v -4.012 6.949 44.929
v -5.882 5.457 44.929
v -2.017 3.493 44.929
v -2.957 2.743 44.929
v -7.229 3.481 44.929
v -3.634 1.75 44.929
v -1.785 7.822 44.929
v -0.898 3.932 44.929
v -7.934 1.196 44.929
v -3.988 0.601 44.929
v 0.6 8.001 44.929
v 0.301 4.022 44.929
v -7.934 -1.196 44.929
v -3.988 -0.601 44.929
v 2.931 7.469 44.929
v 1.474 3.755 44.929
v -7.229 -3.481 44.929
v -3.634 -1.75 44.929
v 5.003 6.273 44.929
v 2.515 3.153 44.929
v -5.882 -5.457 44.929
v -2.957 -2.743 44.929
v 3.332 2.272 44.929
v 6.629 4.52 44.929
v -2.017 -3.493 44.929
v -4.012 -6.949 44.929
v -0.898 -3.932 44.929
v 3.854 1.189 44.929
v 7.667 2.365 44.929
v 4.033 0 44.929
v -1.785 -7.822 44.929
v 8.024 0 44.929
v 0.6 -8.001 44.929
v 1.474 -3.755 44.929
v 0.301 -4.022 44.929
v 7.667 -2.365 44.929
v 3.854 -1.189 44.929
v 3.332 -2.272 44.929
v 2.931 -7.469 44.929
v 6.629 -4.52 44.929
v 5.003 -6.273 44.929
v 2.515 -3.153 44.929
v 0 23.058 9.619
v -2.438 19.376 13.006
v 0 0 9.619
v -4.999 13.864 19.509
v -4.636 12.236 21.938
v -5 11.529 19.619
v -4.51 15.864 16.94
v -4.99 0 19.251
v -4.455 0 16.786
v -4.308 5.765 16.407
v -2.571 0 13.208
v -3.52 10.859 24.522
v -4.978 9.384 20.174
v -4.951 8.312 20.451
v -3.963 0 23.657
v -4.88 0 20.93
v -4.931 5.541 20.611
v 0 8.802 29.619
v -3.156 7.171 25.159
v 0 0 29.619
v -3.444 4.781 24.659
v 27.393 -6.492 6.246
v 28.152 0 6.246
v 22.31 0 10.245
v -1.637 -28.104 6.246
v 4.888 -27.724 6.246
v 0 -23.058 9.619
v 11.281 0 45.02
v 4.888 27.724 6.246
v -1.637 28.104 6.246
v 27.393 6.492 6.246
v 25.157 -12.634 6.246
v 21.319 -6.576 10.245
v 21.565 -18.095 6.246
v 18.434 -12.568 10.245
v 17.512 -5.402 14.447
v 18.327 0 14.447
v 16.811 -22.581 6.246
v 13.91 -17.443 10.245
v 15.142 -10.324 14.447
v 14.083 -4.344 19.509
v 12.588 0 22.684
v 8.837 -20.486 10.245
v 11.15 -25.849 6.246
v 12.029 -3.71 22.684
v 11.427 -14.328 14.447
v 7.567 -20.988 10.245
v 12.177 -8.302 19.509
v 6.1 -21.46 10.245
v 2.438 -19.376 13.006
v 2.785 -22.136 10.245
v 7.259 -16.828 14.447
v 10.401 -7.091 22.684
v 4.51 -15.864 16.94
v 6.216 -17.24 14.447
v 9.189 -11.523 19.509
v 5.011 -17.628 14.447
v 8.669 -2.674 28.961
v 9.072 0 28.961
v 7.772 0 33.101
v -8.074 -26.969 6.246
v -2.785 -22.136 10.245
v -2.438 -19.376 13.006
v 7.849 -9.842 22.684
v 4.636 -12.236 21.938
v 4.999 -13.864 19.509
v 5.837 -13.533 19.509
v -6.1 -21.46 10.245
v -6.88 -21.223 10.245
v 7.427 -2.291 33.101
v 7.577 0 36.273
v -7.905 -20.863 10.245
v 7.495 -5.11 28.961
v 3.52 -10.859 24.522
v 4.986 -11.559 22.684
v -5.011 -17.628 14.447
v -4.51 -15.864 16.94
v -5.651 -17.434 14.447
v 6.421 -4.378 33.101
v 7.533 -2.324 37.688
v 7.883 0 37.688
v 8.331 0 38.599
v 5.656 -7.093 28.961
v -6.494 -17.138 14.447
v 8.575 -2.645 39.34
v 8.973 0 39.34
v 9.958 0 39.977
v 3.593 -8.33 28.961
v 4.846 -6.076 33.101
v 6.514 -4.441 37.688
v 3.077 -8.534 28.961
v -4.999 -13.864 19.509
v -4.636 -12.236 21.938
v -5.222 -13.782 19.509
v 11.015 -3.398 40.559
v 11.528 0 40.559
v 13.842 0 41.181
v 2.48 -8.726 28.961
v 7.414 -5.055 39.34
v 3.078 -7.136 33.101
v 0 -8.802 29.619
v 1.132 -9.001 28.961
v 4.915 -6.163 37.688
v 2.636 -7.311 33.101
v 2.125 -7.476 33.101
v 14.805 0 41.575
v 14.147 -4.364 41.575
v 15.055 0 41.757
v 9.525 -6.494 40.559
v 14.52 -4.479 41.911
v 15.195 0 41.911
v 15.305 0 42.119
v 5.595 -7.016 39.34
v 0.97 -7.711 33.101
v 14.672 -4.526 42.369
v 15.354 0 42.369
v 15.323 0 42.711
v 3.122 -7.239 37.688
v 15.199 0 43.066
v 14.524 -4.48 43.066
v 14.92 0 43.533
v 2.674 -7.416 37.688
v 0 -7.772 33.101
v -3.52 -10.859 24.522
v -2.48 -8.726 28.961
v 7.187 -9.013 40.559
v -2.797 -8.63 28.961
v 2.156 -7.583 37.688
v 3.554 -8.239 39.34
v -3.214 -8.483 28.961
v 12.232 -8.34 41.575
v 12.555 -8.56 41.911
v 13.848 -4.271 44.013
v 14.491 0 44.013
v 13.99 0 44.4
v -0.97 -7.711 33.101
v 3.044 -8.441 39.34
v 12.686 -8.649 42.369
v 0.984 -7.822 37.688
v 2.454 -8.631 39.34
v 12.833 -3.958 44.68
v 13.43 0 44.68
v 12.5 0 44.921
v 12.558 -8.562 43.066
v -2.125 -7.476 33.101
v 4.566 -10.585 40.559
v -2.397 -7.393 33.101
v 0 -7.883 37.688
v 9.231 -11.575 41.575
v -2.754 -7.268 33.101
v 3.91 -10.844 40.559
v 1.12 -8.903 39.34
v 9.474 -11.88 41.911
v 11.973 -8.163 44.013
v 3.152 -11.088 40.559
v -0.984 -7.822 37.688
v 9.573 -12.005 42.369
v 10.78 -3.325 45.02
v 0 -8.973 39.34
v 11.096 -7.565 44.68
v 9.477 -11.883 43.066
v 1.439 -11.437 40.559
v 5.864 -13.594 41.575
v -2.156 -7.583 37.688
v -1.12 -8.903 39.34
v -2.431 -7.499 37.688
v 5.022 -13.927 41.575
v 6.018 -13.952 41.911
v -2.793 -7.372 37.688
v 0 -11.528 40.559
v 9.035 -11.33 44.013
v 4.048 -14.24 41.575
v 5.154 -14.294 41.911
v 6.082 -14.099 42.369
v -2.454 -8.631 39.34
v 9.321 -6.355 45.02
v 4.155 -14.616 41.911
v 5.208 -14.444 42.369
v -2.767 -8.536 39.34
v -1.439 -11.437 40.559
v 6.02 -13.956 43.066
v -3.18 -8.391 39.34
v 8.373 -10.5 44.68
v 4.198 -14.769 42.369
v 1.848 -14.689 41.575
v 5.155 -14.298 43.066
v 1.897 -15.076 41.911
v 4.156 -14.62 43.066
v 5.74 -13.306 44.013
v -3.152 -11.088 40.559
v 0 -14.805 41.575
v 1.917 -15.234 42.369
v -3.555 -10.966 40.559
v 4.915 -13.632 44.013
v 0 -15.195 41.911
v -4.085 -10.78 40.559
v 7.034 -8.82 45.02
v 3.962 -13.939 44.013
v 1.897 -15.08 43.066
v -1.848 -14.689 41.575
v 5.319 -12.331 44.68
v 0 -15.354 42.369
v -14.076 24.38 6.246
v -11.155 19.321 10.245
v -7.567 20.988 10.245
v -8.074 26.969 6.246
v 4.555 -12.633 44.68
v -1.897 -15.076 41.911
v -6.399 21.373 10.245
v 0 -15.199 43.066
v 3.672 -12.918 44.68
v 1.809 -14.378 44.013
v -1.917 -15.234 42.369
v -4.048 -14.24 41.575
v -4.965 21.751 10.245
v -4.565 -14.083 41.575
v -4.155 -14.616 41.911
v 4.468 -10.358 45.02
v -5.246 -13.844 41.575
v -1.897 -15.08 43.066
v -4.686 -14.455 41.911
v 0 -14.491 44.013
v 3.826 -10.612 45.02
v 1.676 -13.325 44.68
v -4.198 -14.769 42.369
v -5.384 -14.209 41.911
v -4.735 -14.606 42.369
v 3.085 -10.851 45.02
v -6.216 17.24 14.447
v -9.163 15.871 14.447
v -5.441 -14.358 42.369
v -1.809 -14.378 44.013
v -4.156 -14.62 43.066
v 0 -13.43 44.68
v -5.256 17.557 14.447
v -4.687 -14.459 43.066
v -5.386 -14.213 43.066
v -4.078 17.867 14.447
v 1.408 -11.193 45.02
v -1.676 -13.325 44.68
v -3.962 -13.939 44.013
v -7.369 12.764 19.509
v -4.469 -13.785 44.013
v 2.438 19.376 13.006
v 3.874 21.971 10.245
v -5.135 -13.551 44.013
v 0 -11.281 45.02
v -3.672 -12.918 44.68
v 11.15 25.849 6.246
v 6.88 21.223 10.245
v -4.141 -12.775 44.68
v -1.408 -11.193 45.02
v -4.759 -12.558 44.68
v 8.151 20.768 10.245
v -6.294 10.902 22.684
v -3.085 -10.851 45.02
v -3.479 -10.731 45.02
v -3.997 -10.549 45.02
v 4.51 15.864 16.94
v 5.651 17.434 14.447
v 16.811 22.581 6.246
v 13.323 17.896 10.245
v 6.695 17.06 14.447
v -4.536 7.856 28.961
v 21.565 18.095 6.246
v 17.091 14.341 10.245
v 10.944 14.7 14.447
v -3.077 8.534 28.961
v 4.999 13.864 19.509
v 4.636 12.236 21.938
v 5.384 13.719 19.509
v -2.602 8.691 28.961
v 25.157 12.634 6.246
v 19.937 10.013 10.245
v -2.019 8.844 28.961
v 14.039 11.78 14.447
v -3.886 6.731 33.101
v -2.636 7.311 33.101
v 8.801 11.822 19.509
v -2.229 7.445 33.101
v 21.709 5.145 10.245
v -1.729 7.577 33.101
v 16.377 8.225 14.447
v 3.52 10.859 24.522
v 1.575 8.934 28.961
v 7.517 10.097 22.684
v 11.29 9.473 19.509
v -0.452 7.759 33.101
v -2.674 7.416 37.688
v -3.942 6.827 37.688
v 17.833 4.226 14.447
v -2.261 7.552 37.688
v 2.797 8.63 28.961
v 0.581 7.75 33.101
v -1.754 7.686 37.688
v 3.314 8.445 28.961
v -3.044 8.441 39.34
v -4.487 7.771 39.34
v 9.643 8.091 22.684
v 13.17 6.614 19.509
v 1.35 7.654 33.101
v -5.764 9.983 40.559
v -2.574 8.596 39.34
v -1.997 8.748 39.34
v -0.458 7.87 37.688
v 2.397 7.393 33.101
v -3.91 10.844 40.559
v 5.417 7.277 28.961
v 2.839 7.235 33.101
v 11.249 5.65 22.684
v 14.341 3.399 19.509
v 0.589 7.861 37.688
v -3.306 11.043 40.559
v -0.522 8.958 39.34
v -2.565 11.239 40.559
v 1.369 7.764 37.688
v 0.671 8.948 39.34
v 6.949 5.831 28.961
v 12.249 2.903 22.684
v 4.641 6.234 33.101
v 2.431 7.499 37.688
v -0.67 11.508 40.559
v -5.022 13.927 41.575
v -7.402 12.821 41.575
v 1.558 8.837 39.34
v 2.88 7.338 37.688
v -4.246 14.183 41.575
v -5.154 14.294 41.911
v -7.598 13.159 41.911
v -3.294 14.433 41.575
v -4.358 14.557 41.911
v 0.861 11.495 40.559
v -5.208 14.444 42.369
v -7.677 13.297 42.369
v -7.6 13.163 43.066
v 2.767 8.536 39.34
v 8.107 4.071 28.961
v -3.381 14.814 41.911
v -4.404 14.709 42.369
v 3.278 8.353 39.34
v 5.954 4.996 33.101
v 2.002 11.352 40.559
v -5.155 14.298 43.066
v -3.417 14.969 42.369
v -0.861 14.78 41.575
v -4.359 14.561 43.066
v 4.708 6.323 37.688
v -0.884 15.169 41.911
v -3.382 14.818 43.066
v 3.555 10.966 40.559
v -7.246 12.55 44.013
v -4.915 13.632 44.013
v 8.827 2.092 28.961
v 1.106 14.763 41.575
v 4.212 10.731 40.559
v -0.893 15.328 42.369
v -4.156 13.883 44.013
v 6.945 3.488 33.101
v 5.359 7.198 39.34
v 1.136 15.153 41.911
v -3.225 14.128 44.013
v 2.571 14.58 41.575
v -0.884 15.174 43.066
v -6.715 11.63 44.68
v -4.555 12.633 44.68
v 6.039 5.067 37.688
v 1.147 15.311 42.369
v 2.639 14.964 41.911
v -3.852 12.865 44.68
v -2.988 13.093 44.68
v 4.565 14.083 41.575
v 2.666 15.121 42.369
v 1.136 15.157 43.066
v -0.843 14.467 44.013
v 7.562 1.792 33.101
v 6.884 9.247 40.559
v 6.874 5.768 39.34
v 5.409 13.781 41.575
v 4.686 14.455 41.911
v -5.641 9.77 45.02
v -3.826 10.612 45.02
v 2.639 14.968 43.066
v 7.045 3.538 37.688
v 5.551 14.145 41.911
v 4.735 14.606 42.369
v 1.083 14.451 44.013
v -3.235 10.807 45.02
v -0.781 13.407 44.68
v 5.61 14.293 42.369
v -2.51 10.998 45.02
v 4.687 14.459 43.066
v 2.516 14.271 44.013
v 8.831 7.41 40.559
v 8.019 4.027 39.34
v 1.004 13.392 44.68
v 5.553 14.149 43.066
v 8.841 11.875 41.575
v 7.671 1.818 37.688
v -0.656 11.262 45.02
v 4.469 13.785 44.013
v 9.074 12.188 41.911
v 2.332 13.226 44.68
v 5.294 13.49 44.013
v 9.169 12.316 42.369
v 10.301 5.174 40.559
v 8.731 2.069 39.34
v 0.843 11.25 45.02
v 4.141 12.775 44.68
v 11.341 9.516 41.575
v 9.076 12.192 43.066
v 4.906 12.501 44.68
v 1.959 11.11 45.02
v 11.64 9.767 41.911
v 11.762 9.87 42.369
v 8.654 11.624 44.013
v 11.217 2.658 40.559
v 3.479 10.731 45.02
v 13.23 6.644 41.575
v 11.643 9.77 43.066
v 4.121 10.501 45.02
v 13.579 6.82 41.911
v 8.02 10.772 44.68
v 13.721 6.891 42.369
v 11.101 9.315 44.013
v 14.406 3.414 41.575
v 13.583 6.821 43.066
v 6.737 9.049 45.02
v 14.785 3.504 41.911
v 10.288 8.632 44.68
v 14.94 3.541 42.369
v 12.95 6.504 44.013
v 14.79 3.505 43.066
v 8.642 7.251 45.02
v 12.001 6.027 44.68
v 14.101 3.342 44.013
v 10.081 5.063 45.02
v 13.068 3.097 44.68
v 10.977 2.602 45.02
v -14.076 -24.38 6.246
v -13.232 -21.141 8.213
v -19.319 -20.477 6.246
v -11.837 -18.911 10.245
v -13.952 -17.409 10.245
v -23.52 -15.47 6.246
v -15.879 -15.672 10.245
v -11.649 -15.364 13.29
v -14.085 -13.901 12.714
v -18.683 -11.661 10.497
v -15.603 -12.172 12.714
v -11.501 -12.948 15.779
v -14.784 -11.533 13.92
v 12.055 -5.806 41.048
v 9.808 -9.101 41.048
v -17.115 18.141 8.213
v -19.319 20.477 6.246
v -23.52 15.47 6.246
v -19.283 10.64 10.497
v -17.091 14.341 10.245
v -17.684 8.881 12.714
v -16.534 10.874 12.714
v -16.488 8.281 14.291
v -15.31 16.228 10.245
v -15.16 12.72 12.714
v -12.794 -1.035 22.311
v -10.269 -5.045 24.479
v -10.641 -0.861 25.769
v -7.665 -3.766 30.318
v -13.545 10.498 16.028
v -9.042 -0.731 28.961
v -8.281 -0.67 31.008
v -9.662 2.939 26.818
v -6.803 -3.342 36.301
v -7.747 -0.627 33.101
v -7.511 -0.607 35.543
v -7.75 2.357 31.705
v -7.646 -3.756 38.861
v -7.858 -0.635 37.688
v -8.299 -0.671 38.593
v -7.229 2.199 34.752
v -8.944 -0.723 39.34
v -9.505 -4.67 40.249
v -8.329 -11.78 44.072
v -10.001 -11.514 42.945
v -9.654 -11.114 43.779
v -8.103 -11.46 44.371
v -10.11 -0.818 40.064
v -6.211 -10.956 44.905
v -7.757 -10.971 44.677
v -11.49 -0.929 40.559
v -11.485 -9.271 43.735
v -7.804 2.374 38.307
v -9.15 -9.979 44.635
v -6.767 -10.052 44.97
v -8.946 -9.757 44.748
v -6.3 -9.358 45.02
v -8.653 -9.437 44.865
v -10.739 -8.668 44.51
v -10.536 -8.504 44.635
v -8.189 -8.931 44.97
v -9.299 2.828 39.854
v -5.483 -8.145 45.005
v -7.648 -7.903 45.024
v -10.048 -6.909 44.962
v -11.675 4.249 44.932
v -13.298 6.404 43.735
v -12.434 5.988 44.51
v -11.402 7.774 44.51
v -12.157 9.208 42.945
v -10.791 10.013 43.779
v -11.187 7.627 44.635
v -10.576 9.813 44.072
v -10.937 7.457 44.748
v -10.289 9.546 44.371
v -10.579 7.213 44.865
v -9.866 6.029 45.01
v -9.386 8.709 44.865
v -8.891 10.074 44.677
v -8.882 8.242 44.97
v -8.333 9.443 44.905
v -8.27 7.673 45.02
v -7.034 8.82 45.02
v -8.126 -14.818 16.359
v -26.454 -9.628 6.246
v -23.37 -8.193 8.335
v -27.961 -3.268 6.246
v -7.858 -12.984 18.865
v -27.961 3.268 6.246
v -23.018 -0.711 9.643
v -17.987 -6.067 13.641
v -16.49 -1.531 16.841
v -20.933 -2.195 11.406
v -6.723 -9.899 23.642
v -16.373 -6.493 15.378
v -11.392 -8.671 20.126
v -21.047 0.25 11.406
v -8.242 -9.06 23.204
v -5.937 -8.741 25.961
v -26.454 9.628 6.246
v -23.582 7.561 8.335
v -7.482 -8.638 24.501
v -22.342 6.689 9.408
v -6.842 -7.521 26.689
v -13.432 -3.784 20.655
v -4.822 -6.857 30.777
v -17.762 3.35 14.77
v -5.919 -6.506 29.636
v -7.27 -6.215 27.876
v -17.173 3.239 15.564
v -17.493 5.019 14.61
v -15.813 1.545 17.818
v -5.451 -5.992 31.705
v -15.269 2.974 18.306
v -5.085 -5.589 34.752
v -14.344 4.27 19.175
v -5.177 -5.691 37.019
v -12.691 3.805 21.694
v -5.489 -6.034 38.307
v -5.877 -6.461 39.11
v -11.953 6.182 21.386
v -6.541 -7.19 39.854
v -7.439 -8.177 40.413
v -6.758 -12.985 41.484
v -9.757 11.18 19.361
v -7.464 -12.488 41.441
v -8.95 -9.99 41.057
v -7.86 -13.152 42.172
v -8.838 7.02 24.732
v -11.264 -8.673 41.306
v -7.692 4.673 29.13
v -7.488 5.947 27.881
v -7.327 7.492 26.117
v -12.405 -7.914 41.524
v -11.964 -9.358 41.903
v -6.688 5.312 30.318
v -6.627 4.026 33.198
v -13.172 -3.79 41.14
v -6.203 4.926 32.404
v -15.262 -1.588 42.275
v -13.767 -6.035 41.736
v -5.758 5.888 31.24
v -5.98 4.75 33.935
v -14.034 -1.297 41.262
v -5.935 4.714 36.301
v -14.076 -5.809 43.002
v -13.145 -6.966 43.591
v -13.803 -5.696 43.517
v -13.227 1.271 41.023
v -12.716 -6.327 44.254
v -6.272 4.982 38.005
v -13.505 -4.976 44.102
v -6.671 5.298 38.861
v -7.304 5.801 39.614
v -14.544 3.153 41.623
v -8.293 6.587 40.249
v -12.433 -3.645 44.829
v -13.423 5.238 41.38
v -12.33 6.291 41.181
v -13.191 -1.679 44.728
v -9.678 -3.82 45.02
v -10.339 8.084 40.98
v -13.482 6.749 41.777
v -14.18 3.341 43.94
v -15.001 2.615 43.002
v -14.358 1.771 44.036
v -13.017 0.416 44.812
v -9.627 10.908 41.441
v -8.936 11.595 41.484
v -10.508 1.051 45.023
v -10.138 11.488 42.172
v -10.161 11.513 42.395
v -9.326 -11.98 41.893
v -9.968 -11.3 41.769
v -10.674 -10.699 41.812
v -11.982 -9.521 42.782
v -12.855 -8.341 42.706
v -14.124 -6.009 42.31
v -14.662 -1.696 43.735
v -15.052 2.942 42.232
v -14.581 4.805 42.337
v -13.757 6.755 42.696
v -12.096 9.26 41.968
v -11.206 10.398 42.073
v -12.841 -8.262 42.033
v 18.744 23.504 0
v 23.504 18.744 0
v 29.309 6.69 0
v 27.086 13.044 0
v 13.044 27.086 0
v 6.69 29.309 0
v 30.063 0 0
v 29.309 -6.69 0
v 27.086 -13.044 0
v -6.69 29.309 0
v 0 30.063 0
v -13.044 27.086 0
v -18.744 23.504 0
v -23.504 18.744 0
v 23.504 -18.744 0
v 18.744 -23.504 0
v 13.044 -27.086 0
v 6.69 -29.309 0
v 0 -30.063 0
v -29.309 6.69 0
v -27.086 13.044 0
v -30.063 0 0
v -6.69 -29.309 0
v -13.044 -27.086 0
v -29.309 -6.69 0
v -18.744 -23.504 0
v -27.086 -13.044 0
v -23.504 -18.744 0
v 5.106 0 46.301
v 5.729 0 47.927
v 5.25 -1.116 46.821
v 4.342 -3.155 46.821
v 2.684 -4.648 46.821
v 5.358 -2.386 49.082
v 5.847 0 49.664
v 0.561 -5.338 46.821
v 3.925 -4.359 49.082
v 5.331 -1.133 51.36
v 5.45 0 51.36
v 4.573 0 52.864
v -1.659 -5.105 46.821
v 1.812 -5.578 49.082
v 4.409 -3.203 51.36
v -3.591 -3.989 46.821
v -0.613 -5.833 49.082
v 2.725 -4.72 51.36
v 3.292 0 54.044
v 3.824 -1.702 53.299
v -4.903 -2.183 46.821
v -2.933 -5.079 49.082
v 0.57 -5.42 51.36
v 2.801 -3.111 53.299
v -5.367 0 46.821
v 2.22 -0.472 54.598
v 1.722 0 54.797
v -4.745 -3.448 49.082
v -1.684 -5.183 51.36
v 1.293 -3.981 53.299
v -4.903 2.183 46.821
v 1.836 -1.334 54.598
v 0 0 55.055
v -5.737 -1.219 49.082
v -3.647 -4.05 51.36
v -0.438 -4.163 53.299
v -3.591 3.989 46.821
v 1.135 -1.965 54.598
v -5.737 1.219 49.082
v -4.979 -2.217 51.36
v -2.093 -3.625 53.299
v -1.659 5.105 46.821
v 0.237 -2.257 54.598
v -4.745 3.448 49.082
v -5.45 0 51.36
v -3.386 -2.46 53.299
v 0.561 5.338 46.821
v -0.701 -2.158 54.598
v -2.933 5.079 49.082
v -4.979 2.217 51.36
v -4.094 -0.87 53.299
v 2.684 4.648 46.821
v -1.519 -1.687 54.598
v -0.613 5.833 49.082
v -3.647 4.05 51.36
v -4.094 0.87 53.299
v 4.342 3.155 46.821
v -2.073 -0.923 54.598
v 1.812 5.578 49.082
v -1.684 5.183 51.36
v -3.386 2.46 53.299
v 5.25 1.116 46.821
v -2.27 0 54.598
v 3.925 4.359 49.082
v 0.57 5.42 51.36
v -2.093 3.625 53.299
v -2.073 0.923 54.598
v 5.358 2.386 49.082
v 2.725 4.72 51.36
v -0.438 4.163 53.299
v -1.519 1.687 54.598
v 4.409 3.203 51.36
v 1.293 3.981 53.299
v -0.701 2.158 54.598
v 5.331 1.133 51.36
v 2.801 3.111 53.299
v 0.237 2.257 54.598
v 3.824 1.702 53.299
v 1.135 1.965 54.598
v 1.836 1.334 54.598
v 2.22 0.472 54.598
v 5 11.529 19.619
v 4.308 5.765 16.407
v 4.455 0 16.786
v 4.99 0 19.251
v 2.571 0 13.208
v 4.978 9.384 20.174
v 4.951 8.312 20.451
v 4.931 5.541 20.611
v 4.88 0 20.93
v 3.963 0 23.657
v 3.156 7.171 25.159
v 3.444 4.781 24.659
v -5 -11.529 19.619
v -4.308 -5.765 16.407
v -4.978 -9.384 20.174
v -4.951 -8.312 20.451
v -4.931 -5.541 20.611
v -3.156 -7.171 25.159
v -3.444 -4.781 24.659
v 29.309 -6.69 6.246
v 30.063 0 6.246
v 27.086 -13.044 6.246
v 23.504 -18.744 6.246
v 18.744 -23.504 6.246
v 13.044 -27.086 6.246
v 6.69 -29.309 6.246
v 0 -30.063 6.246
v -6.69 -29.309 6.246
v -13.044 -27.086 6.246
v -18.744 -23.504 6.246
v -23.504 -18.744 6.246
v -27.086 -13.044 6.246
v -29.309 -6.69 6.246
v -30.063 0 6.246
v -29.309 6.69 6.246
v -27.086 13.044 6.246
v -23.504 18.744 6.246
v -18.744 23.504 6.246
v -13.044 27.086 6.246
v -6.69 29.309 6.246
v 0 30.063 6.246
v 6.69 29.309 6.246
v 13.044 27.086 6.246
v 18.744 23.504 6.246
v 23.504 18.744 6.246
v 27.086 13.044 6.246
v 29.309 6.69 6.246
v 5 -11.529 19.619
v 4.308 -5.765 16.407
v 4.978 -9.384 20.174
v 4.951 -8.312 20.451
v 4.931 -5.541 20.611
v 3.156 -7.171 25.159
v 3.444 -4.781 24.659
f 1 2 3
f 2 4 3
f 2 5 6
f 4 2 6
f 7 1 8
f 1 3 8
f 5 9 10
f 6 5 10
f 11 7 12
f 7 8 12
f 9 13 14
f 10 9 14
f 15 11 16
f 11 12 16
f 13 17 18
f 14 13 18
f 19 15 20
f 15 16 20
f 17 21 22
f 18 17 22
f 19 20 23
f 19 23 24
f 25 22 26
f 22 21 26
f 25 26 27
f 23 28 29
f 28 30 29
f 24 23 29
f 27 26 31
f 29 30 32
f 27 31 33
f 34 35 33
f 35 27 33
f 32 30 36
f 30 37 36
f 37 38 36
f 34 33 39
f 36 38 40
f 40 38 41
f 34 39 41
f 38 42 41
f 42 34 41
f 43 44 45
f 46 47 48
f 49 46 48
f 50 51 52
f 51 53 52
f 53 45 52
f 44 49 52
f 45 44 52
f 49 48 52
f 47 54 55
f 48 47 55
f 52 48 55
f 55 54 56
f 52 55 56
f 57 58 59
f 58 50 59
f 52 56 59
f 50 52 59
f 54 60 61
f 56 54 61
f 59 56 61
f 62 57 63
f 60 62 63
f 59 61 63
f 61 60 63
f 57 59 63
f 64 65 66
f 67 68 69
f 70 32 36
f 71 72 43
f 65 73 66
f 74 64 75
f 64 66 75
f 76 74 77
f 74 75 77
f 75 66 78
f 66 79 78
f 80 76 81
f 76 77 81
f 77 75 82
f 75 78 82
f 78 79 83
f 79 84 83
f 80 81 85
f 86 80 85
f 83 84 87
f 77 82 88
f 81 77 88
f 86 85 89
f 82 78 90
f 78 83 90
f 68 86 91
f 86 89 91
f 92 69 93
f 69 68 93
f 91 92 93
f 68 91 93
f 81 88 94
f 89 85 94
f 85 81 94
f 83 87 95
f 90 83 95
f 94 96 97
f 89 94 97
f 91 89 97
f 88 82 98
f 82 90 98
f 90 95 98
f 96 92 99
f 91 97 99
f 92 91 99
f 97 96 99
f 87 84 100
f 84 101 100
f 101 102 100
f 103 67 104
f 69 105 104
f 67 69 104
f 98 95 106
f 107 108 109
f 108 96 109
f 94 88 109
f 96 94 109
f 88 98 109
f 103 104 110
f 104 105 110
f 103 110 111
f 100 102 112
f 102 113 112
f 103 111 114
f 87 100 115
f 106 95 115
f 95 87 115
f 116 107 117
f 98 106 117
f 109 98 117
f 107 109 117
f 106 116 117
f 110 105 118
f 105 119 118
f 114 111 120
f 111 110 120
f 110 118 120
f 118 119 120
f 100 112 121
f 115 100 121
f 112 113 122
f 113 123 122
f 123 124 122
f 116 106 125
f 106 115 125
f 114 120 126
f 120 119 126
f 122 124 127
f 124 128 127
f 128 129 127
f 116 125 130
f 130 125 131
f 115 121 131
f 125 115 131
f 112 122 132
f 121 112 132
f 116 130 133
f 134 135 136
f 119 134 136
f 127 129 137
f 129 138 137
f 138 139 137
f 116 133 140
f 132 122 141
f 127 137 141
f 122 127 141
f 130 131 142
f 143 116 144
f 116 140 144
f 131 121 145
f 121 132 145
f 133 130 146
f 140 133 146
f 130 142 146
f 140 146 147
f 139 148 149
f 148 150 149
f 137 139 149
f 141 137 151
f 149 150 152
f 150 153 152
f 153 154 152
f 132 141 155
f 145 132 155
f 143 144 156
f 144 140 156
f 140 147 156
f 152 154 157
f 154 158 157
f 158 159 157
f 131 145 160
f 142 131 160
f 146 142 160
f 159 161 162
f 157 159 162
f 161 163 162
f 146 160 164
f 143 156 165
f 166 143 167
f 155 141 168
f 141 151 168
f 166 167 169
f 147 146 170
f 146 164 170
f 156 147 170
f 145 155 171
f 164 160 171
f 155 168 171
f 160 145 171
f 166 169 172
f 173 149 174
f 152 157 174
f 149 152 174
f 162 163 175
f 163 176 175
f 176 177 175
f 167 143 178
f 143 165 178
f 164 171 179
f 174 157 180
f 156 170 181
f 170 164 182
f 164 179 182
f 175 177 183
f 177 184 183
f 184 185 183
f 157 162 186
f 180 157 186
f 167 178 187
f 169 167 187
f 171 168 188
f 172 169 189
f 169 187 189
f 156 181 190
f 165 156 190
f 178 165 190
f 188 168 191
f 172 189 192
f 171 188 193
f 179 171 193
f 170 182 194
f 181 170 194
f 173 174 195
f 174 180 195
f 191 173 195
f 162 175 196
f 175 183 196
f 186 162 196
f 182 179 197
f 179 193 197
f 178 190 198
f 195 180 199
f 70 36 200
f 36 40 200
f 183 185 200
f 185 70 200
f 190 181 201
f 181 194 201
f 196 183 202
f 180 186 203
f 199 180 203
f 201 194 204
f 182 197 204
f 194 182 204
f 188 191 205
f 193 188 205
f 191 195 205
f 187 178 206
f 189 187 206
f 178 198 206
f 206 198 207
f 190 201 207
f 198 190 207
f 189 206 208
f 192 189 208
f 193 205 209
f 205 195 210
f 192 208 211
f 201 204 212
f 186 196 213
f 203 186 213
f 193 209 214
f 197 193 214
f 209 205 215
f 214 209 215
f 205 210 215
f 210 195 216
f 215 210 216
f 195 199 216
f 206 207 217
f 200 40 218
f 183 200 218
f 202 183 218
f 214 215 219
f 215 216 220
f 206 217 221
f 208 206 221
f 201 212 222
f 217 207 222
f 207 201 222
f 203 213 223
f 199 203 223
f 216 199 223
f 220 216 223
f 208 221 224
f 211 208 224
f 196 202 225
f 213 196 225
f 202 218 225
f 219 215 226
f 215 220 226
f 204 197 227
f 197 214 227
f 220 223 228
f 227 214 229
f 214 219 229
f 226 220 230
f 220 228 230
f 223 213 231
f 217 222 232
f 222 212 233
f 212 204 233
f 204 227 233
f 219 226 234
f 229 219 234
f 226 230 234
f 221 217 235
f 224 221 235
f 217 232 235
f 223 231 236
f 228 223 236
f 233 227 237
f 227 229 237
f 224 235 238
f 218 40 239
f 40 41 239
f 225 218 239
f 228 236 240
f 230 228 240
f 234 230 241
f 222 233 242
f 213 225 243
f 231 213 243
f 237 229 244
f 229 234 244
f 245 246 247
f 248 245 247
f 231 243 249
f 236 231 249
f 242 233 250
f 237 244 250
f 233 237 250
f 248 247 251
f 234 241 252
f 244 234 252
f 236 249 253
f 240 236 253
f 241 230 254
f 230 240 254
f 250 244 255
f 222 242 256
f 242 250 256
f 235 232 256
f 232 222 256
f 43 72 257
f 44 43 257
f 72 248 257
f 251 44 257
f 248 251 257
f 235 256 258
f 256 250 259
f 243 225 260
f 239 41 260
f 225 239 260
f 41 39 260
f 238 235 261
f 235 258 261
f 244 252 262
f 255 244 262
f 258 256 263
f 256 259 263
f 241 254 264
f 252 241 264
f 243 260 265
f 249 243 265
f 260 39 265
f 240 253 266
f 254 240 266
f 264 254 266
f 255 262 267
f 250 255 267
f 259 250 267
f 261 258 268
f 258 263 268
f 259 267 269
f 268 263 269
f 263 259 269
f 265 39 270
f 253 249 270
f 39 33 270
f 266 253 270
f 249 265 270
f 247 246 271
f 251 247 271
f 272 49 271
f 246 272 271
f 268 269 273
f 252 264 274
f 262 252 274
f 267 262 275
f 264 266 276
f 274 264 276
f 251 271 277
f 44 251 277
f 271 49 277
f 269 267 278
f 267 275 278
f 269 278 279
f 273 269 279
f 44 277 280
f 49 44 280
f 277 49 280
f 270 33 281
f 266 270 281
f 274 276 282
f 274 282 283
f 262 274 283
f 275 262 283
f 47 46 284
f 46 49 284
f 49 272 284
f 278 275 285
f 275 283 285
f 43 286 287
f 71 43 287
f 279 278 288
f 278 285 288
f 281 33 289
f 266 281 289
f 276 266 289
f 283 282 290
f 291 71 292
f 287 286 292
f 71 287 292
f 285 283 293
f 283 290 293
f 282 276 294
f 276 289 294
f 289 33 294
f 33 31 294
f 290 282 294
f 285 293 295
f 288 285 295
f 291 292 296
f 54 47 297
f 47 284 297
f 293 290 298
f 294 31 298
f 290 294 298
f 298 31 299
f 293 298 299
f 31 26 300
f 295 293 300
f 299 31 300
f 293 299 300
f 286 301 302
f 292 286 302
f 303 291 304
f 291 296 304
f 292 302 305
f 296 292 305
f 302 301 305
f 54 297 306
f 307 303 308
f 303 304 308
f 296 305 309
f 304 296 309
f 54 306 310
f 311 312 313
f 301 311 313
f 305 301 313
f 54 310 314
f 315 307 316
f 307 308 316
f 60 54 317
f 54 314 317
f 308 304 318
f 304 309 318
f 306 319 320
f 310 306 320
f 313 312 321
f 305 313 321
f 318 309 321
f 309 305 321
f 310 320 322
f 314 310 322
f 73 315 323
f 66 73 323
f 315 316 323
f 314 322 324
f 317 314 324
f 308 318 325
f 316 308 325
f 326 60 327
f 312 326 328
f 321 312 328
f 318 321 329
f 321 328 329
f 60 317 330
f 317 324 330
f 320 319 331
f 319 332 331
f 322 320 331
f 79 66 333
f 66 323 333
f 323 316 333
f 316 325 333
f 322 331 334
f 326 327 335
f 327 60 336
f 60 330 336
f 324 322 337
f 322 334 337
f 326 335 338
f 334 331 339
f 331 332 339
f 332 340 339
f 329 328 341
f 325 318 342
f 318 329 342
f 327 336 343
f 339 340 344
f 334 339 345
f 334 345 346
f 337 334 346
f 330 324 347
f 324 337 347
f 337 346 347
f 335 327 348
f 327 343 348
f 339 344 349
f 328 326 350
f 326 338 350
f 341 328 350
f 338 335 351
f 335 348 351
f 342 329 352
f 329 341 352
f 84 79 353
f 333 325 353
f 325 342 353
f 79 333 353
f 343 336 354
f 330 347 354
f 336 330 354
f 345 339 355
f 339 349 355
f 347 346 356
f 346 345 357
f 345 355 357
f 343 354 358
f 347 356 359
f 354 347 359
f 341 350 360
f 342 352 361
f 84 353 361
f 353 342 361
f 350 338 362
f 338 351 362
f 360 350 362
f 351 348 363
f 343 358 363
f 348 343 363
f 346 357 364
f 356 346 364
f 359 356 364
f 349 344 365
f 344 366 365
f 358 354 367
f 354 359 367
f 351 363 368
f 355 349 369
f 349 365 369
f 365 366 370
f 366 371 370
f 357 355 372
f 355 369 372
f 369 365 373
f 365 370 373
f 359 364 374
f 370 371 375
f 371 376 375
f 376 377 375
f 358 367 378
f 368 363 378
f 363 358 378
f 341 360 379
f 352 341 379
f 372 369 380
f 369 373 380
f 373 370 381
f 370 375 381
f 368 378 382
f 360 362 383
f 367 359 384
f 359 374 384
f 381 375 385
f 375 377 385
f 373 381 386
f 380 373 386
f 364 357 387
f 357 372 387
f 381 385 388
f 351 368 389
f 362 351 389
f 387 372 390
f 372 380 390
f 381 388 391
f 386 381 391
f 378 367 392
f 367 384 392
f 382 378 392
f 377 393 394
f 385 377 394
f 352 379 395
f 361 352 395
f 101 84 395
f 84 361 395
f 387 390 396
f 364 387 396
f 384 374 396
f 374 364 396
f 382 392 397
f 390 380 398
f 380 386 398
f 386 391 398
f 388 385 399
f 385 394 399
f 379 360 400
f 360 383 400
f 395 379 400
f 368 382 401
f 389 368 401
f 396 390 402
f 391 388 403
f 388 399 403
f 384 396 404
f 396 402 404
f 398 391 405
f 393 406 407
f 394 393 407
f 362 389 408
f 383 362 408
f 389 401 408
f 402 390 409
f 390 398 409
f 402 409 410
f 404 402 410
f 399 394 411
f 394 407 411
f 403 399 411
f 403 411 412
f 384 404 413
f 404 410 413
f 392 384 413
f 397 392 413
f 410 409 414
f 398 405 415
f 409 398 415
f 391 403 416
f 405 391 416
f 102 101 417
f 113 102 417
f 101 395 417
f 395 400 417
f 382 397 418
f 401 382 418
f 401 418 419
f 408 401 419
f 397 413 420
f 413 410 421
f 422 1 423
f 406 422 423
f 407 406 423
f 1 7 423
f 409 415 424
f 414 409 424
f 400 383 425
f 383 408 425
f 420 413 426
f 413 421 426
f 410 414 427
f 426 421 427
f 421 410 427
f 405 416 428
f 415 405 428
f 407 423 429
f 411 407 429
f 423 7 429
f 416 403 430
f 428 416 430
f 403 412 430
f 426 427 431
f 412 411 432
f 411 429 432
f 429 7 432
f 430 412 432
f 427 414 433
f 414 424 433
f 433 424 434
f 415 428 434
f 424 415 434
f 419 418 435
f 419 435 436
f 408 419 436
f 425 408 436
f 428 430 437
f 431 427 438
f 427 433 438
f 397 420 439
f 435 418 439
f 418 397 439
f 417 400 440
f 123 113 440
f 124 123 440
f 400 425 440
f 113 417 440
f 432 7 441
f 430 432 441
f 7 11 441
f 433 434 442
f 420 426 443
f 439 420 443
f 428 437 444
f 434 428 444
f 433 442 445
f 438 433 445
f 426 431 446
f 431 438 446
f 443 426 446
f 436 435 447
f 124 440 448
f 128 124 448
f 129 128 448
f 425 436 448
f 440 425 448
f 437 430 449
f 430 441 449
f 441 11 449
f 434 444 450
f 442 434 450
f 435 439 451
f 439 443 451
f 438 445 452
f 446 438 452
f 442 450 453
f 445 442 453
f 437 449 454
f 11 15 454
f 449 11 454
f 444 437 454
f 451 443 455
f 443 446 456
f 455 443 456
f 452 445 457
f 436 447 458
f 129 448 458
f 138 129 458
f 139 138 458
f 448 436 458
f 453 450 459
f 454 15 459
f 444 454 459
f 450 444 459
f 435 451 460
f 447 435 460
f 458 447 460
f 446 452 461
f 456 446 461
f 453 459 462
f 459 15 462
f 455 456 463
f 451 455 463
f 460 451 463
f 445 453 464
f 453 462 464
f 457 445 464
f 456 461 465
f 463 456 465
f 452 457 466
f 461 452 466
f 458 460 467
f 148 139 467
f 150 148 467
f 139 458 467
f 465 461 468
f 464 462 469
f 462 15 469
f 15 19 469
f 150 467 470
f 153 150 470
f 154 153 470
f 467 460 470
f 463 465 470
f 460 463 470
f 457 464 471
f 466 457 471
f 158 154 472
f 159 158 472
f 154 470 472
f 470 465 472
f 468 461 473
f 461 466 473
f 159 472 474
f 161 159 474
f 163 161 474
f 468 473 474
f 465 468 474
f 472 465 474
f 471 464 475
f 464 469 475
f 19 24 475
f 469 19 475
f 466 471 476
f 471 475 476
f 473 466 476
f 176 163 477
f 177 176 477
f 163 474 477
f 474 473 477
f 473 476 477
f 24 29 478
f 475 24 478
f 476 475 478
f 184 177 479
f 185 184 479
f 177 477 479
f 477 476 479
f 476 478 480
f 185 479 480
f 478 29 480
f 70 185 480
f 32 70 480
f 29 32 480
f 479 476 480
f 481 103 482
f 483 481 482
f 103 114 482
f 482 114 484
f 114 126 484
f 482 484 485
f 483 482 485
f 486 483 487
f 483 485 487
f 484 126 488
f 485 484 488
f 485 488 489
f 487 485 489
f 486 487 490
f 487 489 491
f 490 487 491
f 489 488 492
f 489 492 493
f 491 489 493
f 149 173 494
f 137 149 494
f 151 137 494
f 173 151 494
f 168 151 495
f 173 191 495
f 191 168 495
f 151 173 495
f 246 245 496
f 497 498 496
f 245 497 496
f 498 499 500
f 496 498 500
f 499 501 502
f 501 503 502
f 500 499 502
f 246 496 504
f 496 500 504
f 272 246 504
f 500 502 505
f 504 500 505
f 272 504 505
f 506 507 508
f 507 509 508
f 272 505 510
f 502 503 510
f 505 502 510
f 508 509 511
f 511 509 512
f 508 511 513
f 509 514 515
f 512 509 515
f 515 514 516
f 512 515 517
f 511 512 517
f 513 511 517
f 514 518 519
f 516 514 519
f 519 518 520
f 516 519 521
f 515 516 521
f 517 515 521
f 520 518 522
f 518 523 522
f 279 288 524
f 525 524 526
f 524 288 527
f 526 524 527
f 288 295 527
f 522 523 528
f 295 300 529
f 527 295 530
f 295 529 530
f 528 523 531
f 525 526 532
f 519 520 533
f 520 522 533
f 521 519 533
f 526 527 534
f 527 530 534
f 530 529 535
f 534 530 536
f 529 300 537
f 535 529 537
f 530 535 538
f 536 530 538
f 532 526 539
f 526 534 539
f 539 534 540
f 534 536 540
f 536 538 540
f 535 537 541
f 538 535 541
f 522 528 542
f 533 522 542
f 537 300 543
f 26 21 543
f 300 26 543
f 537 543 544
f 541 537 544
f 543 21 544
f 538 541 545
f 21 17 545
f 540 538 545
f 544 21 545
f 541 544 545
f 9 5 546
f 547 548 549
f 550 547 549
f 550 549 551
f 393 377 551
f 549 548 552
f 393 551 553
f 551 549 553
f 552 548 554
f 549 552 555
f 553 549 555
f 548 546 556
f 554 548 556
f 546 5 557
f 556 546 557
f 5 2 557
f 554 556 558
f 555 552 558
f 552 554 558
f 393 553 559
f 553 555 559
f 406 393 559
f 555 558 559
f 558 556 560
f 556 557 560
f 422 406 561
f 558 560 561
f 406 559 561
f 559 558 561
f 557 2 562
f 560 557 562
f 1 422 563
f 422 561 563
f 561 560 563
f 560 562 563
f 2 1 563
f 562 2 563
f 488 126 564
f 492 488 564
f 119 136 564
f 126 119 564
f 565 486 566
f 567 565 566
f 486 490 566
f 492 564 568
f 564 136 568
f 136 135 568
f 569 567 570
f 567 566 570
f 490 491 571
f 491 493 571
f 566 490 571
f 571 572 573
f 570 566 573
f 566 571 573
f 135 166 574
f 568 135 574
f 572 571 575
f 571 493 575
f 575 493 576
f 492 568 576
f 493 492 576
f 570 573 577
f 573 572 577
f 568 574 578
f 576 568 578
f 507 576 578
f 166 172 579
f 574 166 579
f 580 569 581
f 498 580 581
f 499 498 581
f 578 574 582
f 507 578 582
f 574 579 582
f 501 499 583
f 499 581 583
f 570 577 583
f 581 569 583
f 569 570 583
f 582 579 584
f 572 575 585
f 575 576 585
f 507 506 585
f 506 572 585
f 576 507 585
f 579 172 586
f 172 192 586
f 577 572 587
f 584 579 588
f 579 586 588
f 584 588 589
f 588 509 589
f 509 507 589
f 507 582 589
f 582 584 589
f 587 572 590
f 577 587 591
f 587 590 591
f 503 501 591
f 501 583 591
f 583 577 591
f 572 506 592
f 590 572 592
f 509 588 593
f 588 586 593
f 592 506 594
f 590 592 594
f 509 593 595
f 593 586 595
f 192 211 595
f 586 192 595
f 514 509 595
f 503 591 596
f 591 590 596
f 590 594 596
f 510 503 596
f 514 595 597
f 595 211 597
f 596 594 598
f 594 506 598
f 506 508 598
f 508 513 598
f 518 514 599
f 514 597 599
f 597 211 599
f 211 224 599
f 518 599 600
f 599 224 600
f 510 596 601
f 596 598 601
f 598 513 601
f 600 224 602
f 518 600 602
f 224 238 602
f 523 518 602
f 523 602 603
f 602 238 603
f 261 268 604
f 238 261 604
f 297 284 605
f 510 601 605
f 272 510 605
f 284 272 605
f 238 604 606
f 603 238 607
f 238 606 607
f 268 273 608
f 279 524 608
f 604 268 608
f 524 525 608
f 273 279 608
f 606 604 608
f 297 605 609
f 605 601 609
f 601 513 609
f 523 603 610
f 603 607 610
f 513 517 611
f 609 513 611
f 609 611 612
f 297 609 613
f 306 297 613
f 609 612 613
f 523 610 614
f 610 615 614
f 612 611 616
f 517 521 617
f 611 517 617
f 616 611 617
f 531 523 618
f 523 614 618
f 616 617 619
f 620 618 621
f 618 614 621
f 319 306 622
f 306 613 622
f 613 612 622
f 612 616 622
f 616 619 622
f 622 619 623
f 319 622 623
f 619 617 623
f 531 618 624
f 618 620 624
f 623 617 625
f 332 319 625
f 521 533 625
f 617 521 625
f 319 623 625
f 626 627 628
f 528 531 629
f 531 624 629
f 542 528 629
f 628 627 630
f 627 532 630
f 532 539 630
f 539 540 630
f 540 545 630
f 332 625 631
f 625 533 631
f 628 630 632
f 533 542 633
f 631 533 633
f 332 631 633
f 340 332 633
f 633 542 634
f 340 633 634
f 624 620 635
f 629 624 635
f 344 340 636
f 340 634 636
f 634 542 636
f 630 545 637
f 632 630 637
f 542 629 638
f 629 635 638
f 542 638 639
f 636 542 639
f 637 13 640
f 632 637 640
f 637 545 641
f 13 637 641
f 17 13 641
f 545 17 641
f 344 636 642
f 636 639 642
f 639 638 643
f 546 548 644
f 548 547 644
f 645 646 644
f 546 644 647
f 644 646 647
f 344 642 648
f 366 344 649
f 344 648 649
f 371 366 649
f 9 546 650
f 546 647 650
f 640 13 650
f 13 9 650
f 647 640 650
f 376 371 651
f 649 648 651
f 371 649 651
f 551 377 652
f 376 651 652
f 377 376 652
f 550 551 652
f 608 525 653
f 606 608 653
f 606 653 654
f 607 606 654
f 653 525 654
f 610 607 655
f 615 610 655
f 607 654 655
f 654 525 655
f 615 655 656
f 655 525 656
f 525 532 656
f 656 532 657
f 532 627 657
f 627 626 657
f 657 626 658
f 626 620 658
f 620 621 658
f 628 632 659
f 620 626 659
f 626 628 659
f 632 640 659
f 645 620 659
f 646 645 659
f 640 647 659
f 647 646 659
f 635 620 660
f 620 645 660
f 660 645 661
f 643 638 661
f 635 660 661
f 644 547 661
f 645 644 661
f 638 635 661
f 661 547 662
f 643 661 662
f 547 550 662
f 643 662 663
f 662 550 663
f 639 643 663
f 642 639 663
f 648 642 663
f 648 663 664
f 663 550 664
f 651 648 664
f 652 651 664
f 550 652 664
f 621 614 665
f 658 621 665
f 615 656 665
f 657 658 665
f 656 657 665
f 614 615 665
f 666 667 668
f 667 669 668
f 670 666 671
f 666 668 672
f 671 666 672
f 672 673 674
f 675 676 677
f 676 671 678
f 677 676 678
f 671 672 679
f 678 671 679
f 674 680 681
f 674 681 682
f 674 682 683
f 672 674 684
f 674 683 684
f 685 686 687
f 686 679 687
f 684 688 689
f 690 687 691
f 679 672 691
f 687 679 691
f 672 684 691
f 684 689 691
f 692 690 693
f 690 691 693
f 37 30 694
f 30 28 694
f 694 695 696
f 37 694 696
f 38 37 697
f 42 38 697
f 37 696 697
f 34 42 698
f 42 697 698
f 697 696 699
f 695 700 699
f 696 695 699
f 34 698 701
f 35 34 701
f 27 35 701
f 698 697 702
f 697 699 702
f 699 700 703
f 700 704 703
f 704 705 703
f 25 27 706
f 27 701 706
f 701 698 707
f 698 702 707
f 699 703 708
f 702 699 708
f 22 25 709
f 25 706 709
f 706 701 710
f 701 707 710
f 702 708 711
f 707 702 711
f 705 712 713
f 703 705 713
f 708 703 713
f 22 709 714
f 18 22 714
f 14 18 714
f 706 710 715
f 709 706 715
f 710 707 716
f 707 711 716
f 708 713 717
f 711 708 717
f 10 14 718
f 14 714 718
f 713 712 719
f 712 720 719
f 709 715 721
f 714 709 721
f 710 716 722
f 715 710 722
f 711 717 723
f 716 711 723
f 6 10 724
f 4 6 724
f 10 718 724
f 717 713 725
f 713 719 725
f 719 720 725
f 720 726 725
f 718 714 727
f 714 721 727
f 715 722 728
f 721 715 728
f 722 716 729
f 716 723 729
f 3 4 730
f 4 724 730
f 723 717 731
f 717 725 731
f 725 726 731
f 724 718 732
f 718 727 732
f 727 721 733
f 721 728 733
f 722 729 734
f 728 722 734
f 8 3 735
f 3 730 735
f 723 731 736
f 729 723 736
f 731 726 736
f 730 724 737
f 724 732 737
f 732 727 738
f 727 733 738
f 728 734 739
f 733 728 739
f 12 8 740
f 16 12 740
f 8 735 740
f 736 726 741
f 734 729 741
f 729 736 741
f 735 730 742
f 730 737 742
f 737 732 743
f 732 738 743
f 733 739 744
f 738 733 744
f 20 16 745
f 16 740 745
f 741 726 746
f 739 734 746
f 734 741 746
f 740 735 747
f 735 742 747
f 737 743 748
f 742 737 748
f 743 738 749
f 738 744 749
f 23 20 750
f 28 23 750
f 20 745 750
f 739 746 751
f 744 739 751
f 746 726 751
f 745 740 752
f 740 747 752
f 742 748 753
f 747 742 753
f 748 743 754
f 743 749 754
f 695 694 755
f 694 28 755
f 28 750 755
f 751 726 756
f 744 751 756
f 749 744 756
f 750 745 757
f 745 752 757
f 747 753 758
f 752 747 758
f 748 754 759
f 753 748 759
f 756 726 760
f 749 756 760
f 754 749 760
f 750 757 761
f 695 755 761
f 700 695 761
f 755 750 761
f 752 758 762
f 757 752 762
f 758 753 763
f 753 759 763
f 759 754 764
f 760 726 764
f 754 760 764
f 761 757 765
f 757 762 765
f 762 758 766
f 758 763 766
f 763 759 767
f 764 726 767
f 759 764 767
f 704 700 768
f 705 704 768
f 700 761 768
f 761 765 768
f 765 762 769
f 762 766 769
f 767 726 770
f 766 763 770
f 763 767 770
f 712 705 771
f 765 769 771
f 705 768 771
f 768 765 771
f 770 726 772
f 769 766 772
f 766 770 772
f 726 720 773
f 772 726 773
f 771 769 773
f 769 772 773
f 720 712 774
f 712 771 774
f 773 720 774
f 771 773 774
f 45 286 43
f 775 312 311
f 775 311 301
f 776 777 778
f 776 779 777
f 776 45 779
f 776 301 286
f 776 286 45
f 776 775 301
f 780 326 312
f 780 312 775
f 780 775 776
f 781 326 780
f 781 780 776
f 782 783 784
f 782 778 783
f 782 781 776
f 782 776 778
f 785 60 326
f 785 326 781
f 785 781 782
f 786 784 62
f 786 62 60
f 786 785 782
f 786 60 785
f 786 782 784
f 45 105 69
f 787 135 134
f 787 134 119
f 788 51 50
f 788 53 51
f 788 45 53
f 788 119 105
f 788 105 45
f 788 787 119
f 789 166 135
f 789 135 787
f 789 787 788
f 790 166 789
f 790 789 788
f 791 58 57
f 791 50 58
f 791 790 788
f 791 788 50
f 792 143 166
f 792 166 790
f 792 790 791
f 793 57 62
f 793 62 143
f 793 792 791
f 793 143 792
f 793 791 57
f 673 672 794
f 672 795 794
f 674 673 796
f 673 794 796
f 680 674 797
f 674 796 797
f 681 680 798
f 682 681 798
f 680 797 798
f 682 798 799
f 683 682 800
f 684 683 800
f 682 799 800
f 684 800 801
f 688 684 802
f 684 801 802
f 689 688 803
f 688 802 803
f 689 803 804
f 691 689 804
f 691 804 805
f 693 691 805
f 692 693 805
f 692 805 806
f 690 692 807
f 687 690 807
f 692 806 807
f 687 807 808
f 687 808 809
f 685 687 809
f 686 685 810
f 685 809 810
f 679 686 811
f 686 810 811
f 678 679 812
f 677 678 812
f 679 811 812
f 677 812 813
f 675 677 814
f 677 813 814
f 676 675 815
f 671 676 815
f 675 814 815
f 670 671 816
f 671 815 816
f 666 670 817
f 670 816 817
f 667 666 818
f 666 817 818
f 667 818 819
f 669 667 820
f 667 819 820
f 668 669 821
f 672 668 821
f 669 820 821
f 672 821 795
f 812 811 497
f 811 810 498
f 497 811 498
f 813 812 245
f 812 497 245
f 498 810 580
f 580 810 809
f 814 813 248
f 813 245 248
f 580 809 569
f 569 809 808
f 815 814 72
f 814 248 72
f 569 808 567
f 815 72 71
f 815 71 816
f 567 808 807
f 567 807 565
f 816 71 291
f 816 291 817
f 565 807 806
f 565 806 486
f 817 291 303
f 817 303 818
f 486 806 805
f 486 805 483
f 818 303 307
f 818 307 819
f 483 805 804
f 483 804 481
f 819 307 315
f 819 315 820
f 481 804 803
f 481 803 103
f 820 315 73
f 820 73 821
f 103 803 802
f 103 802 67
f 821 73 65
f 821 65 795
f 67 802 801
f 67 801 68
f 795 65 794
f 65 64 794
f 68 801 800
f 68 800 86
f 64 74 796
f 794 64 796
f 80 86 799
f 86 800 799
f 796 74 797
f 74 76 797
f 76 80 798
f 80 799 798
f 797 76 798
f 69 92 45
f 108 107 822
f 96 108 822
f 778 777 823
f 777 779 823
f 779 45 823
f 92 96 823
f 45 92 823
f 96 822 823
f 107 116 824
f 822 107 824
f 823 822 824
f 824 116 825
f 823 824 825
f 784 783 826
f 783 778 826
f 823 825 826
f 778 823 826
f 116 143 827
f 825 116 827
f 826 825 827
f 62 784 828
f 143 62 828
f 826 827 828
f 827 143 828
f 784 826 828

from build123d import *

# Parameters (mm, degrees)
F3_DEPTH      = 30.0639232079
F3_DEPTH_BACK = 30.0639232079


with BuildPart() as f1:
    # F0 (on Front) → F1 (revolve)
    with BuildSketch(Plane.XZ):
        with BuildLine():
            Line((0, 55.0550706685), (0, 0))
            Line((0, 0), (30.0629232079, 0))
            Line((30.0629232079, 0), (30.0629232079, 6.2461961061))
            Line((30.0629232079, 6.2461961061), (28.1515177339, 6.2461961061))
            add(Edge.make_bspline(
                [(28.1515177339, 6.2461961061), (20.8514027433, 10.2224548639), (15.5688193856, 18.5466500971), (7.6461738794, 29.5347998868), (6.7391293859, 40.9108059528), (16.6325883831, 40.8602065067), (14.1007108995, 45.2241793388), (11.379963248, 45.0847172222), (8.0235246569, 44.9291057885)],
                knots=[0, 0, 0, 0, 0.2445178736, 0.4524899116, 0.6209734583, 0.7676825545, 0.8568521555, 1, 1, 1, 1], degree=3))
            Line((8.0235246569, 44.9291057885), (4.0333306828, 44.9291057885))
            ThreePointArc((4.0333306828, 44.9291057885), (5.4498376386, 51.3595746191), (0, 55.0550706685))
        make_face()
    revolve(axis=Axis((0, 0, 27.5275353342), (0, 0, -1)))

    # F2 (on Front) → F3 (cut, two sides)
    with BuildSketch(Plane.XZ) as f3_sk:
        with BuildLine():
            Line((0, 9.6192849411), (0, 29.6192849411))
            add(Edge.make_bspline(
                [(0, 29.6192849411), (-2.5065675998, 26.3852821126), (-7.4998516638, 19.5617489866), (-2.4937290726, 12.9683596788), (0, 9.6192849411)],
                knots=[0, 0, 0, 0, 0.5, 1, 1, 1, 1], degree=3))
        make_face()
        with BuildLine():
            add(Edge.make_bspline(
                [(0, 29.6192849411), (2.5065675998, 26.3852821126), (7.4998516638, 19.5617489866), (2.4937290726, 12.9683596788), (0, 9.6192849411)],
                knots=[0, 0, 0, 0, 0.5, 1, 1, 1, 1], degree=3))
            Line((0, 29.6192849411), (0, 9.6192849411))
        make_face()
    extrude(amount=-F3_DEPTH, mode=Mode.SUBTRACT)
    extrude(f3_sk.sketch, amount=F3_DEPTH_BACK, mode=Mode.SUBTRACT)


solid = f1.part
